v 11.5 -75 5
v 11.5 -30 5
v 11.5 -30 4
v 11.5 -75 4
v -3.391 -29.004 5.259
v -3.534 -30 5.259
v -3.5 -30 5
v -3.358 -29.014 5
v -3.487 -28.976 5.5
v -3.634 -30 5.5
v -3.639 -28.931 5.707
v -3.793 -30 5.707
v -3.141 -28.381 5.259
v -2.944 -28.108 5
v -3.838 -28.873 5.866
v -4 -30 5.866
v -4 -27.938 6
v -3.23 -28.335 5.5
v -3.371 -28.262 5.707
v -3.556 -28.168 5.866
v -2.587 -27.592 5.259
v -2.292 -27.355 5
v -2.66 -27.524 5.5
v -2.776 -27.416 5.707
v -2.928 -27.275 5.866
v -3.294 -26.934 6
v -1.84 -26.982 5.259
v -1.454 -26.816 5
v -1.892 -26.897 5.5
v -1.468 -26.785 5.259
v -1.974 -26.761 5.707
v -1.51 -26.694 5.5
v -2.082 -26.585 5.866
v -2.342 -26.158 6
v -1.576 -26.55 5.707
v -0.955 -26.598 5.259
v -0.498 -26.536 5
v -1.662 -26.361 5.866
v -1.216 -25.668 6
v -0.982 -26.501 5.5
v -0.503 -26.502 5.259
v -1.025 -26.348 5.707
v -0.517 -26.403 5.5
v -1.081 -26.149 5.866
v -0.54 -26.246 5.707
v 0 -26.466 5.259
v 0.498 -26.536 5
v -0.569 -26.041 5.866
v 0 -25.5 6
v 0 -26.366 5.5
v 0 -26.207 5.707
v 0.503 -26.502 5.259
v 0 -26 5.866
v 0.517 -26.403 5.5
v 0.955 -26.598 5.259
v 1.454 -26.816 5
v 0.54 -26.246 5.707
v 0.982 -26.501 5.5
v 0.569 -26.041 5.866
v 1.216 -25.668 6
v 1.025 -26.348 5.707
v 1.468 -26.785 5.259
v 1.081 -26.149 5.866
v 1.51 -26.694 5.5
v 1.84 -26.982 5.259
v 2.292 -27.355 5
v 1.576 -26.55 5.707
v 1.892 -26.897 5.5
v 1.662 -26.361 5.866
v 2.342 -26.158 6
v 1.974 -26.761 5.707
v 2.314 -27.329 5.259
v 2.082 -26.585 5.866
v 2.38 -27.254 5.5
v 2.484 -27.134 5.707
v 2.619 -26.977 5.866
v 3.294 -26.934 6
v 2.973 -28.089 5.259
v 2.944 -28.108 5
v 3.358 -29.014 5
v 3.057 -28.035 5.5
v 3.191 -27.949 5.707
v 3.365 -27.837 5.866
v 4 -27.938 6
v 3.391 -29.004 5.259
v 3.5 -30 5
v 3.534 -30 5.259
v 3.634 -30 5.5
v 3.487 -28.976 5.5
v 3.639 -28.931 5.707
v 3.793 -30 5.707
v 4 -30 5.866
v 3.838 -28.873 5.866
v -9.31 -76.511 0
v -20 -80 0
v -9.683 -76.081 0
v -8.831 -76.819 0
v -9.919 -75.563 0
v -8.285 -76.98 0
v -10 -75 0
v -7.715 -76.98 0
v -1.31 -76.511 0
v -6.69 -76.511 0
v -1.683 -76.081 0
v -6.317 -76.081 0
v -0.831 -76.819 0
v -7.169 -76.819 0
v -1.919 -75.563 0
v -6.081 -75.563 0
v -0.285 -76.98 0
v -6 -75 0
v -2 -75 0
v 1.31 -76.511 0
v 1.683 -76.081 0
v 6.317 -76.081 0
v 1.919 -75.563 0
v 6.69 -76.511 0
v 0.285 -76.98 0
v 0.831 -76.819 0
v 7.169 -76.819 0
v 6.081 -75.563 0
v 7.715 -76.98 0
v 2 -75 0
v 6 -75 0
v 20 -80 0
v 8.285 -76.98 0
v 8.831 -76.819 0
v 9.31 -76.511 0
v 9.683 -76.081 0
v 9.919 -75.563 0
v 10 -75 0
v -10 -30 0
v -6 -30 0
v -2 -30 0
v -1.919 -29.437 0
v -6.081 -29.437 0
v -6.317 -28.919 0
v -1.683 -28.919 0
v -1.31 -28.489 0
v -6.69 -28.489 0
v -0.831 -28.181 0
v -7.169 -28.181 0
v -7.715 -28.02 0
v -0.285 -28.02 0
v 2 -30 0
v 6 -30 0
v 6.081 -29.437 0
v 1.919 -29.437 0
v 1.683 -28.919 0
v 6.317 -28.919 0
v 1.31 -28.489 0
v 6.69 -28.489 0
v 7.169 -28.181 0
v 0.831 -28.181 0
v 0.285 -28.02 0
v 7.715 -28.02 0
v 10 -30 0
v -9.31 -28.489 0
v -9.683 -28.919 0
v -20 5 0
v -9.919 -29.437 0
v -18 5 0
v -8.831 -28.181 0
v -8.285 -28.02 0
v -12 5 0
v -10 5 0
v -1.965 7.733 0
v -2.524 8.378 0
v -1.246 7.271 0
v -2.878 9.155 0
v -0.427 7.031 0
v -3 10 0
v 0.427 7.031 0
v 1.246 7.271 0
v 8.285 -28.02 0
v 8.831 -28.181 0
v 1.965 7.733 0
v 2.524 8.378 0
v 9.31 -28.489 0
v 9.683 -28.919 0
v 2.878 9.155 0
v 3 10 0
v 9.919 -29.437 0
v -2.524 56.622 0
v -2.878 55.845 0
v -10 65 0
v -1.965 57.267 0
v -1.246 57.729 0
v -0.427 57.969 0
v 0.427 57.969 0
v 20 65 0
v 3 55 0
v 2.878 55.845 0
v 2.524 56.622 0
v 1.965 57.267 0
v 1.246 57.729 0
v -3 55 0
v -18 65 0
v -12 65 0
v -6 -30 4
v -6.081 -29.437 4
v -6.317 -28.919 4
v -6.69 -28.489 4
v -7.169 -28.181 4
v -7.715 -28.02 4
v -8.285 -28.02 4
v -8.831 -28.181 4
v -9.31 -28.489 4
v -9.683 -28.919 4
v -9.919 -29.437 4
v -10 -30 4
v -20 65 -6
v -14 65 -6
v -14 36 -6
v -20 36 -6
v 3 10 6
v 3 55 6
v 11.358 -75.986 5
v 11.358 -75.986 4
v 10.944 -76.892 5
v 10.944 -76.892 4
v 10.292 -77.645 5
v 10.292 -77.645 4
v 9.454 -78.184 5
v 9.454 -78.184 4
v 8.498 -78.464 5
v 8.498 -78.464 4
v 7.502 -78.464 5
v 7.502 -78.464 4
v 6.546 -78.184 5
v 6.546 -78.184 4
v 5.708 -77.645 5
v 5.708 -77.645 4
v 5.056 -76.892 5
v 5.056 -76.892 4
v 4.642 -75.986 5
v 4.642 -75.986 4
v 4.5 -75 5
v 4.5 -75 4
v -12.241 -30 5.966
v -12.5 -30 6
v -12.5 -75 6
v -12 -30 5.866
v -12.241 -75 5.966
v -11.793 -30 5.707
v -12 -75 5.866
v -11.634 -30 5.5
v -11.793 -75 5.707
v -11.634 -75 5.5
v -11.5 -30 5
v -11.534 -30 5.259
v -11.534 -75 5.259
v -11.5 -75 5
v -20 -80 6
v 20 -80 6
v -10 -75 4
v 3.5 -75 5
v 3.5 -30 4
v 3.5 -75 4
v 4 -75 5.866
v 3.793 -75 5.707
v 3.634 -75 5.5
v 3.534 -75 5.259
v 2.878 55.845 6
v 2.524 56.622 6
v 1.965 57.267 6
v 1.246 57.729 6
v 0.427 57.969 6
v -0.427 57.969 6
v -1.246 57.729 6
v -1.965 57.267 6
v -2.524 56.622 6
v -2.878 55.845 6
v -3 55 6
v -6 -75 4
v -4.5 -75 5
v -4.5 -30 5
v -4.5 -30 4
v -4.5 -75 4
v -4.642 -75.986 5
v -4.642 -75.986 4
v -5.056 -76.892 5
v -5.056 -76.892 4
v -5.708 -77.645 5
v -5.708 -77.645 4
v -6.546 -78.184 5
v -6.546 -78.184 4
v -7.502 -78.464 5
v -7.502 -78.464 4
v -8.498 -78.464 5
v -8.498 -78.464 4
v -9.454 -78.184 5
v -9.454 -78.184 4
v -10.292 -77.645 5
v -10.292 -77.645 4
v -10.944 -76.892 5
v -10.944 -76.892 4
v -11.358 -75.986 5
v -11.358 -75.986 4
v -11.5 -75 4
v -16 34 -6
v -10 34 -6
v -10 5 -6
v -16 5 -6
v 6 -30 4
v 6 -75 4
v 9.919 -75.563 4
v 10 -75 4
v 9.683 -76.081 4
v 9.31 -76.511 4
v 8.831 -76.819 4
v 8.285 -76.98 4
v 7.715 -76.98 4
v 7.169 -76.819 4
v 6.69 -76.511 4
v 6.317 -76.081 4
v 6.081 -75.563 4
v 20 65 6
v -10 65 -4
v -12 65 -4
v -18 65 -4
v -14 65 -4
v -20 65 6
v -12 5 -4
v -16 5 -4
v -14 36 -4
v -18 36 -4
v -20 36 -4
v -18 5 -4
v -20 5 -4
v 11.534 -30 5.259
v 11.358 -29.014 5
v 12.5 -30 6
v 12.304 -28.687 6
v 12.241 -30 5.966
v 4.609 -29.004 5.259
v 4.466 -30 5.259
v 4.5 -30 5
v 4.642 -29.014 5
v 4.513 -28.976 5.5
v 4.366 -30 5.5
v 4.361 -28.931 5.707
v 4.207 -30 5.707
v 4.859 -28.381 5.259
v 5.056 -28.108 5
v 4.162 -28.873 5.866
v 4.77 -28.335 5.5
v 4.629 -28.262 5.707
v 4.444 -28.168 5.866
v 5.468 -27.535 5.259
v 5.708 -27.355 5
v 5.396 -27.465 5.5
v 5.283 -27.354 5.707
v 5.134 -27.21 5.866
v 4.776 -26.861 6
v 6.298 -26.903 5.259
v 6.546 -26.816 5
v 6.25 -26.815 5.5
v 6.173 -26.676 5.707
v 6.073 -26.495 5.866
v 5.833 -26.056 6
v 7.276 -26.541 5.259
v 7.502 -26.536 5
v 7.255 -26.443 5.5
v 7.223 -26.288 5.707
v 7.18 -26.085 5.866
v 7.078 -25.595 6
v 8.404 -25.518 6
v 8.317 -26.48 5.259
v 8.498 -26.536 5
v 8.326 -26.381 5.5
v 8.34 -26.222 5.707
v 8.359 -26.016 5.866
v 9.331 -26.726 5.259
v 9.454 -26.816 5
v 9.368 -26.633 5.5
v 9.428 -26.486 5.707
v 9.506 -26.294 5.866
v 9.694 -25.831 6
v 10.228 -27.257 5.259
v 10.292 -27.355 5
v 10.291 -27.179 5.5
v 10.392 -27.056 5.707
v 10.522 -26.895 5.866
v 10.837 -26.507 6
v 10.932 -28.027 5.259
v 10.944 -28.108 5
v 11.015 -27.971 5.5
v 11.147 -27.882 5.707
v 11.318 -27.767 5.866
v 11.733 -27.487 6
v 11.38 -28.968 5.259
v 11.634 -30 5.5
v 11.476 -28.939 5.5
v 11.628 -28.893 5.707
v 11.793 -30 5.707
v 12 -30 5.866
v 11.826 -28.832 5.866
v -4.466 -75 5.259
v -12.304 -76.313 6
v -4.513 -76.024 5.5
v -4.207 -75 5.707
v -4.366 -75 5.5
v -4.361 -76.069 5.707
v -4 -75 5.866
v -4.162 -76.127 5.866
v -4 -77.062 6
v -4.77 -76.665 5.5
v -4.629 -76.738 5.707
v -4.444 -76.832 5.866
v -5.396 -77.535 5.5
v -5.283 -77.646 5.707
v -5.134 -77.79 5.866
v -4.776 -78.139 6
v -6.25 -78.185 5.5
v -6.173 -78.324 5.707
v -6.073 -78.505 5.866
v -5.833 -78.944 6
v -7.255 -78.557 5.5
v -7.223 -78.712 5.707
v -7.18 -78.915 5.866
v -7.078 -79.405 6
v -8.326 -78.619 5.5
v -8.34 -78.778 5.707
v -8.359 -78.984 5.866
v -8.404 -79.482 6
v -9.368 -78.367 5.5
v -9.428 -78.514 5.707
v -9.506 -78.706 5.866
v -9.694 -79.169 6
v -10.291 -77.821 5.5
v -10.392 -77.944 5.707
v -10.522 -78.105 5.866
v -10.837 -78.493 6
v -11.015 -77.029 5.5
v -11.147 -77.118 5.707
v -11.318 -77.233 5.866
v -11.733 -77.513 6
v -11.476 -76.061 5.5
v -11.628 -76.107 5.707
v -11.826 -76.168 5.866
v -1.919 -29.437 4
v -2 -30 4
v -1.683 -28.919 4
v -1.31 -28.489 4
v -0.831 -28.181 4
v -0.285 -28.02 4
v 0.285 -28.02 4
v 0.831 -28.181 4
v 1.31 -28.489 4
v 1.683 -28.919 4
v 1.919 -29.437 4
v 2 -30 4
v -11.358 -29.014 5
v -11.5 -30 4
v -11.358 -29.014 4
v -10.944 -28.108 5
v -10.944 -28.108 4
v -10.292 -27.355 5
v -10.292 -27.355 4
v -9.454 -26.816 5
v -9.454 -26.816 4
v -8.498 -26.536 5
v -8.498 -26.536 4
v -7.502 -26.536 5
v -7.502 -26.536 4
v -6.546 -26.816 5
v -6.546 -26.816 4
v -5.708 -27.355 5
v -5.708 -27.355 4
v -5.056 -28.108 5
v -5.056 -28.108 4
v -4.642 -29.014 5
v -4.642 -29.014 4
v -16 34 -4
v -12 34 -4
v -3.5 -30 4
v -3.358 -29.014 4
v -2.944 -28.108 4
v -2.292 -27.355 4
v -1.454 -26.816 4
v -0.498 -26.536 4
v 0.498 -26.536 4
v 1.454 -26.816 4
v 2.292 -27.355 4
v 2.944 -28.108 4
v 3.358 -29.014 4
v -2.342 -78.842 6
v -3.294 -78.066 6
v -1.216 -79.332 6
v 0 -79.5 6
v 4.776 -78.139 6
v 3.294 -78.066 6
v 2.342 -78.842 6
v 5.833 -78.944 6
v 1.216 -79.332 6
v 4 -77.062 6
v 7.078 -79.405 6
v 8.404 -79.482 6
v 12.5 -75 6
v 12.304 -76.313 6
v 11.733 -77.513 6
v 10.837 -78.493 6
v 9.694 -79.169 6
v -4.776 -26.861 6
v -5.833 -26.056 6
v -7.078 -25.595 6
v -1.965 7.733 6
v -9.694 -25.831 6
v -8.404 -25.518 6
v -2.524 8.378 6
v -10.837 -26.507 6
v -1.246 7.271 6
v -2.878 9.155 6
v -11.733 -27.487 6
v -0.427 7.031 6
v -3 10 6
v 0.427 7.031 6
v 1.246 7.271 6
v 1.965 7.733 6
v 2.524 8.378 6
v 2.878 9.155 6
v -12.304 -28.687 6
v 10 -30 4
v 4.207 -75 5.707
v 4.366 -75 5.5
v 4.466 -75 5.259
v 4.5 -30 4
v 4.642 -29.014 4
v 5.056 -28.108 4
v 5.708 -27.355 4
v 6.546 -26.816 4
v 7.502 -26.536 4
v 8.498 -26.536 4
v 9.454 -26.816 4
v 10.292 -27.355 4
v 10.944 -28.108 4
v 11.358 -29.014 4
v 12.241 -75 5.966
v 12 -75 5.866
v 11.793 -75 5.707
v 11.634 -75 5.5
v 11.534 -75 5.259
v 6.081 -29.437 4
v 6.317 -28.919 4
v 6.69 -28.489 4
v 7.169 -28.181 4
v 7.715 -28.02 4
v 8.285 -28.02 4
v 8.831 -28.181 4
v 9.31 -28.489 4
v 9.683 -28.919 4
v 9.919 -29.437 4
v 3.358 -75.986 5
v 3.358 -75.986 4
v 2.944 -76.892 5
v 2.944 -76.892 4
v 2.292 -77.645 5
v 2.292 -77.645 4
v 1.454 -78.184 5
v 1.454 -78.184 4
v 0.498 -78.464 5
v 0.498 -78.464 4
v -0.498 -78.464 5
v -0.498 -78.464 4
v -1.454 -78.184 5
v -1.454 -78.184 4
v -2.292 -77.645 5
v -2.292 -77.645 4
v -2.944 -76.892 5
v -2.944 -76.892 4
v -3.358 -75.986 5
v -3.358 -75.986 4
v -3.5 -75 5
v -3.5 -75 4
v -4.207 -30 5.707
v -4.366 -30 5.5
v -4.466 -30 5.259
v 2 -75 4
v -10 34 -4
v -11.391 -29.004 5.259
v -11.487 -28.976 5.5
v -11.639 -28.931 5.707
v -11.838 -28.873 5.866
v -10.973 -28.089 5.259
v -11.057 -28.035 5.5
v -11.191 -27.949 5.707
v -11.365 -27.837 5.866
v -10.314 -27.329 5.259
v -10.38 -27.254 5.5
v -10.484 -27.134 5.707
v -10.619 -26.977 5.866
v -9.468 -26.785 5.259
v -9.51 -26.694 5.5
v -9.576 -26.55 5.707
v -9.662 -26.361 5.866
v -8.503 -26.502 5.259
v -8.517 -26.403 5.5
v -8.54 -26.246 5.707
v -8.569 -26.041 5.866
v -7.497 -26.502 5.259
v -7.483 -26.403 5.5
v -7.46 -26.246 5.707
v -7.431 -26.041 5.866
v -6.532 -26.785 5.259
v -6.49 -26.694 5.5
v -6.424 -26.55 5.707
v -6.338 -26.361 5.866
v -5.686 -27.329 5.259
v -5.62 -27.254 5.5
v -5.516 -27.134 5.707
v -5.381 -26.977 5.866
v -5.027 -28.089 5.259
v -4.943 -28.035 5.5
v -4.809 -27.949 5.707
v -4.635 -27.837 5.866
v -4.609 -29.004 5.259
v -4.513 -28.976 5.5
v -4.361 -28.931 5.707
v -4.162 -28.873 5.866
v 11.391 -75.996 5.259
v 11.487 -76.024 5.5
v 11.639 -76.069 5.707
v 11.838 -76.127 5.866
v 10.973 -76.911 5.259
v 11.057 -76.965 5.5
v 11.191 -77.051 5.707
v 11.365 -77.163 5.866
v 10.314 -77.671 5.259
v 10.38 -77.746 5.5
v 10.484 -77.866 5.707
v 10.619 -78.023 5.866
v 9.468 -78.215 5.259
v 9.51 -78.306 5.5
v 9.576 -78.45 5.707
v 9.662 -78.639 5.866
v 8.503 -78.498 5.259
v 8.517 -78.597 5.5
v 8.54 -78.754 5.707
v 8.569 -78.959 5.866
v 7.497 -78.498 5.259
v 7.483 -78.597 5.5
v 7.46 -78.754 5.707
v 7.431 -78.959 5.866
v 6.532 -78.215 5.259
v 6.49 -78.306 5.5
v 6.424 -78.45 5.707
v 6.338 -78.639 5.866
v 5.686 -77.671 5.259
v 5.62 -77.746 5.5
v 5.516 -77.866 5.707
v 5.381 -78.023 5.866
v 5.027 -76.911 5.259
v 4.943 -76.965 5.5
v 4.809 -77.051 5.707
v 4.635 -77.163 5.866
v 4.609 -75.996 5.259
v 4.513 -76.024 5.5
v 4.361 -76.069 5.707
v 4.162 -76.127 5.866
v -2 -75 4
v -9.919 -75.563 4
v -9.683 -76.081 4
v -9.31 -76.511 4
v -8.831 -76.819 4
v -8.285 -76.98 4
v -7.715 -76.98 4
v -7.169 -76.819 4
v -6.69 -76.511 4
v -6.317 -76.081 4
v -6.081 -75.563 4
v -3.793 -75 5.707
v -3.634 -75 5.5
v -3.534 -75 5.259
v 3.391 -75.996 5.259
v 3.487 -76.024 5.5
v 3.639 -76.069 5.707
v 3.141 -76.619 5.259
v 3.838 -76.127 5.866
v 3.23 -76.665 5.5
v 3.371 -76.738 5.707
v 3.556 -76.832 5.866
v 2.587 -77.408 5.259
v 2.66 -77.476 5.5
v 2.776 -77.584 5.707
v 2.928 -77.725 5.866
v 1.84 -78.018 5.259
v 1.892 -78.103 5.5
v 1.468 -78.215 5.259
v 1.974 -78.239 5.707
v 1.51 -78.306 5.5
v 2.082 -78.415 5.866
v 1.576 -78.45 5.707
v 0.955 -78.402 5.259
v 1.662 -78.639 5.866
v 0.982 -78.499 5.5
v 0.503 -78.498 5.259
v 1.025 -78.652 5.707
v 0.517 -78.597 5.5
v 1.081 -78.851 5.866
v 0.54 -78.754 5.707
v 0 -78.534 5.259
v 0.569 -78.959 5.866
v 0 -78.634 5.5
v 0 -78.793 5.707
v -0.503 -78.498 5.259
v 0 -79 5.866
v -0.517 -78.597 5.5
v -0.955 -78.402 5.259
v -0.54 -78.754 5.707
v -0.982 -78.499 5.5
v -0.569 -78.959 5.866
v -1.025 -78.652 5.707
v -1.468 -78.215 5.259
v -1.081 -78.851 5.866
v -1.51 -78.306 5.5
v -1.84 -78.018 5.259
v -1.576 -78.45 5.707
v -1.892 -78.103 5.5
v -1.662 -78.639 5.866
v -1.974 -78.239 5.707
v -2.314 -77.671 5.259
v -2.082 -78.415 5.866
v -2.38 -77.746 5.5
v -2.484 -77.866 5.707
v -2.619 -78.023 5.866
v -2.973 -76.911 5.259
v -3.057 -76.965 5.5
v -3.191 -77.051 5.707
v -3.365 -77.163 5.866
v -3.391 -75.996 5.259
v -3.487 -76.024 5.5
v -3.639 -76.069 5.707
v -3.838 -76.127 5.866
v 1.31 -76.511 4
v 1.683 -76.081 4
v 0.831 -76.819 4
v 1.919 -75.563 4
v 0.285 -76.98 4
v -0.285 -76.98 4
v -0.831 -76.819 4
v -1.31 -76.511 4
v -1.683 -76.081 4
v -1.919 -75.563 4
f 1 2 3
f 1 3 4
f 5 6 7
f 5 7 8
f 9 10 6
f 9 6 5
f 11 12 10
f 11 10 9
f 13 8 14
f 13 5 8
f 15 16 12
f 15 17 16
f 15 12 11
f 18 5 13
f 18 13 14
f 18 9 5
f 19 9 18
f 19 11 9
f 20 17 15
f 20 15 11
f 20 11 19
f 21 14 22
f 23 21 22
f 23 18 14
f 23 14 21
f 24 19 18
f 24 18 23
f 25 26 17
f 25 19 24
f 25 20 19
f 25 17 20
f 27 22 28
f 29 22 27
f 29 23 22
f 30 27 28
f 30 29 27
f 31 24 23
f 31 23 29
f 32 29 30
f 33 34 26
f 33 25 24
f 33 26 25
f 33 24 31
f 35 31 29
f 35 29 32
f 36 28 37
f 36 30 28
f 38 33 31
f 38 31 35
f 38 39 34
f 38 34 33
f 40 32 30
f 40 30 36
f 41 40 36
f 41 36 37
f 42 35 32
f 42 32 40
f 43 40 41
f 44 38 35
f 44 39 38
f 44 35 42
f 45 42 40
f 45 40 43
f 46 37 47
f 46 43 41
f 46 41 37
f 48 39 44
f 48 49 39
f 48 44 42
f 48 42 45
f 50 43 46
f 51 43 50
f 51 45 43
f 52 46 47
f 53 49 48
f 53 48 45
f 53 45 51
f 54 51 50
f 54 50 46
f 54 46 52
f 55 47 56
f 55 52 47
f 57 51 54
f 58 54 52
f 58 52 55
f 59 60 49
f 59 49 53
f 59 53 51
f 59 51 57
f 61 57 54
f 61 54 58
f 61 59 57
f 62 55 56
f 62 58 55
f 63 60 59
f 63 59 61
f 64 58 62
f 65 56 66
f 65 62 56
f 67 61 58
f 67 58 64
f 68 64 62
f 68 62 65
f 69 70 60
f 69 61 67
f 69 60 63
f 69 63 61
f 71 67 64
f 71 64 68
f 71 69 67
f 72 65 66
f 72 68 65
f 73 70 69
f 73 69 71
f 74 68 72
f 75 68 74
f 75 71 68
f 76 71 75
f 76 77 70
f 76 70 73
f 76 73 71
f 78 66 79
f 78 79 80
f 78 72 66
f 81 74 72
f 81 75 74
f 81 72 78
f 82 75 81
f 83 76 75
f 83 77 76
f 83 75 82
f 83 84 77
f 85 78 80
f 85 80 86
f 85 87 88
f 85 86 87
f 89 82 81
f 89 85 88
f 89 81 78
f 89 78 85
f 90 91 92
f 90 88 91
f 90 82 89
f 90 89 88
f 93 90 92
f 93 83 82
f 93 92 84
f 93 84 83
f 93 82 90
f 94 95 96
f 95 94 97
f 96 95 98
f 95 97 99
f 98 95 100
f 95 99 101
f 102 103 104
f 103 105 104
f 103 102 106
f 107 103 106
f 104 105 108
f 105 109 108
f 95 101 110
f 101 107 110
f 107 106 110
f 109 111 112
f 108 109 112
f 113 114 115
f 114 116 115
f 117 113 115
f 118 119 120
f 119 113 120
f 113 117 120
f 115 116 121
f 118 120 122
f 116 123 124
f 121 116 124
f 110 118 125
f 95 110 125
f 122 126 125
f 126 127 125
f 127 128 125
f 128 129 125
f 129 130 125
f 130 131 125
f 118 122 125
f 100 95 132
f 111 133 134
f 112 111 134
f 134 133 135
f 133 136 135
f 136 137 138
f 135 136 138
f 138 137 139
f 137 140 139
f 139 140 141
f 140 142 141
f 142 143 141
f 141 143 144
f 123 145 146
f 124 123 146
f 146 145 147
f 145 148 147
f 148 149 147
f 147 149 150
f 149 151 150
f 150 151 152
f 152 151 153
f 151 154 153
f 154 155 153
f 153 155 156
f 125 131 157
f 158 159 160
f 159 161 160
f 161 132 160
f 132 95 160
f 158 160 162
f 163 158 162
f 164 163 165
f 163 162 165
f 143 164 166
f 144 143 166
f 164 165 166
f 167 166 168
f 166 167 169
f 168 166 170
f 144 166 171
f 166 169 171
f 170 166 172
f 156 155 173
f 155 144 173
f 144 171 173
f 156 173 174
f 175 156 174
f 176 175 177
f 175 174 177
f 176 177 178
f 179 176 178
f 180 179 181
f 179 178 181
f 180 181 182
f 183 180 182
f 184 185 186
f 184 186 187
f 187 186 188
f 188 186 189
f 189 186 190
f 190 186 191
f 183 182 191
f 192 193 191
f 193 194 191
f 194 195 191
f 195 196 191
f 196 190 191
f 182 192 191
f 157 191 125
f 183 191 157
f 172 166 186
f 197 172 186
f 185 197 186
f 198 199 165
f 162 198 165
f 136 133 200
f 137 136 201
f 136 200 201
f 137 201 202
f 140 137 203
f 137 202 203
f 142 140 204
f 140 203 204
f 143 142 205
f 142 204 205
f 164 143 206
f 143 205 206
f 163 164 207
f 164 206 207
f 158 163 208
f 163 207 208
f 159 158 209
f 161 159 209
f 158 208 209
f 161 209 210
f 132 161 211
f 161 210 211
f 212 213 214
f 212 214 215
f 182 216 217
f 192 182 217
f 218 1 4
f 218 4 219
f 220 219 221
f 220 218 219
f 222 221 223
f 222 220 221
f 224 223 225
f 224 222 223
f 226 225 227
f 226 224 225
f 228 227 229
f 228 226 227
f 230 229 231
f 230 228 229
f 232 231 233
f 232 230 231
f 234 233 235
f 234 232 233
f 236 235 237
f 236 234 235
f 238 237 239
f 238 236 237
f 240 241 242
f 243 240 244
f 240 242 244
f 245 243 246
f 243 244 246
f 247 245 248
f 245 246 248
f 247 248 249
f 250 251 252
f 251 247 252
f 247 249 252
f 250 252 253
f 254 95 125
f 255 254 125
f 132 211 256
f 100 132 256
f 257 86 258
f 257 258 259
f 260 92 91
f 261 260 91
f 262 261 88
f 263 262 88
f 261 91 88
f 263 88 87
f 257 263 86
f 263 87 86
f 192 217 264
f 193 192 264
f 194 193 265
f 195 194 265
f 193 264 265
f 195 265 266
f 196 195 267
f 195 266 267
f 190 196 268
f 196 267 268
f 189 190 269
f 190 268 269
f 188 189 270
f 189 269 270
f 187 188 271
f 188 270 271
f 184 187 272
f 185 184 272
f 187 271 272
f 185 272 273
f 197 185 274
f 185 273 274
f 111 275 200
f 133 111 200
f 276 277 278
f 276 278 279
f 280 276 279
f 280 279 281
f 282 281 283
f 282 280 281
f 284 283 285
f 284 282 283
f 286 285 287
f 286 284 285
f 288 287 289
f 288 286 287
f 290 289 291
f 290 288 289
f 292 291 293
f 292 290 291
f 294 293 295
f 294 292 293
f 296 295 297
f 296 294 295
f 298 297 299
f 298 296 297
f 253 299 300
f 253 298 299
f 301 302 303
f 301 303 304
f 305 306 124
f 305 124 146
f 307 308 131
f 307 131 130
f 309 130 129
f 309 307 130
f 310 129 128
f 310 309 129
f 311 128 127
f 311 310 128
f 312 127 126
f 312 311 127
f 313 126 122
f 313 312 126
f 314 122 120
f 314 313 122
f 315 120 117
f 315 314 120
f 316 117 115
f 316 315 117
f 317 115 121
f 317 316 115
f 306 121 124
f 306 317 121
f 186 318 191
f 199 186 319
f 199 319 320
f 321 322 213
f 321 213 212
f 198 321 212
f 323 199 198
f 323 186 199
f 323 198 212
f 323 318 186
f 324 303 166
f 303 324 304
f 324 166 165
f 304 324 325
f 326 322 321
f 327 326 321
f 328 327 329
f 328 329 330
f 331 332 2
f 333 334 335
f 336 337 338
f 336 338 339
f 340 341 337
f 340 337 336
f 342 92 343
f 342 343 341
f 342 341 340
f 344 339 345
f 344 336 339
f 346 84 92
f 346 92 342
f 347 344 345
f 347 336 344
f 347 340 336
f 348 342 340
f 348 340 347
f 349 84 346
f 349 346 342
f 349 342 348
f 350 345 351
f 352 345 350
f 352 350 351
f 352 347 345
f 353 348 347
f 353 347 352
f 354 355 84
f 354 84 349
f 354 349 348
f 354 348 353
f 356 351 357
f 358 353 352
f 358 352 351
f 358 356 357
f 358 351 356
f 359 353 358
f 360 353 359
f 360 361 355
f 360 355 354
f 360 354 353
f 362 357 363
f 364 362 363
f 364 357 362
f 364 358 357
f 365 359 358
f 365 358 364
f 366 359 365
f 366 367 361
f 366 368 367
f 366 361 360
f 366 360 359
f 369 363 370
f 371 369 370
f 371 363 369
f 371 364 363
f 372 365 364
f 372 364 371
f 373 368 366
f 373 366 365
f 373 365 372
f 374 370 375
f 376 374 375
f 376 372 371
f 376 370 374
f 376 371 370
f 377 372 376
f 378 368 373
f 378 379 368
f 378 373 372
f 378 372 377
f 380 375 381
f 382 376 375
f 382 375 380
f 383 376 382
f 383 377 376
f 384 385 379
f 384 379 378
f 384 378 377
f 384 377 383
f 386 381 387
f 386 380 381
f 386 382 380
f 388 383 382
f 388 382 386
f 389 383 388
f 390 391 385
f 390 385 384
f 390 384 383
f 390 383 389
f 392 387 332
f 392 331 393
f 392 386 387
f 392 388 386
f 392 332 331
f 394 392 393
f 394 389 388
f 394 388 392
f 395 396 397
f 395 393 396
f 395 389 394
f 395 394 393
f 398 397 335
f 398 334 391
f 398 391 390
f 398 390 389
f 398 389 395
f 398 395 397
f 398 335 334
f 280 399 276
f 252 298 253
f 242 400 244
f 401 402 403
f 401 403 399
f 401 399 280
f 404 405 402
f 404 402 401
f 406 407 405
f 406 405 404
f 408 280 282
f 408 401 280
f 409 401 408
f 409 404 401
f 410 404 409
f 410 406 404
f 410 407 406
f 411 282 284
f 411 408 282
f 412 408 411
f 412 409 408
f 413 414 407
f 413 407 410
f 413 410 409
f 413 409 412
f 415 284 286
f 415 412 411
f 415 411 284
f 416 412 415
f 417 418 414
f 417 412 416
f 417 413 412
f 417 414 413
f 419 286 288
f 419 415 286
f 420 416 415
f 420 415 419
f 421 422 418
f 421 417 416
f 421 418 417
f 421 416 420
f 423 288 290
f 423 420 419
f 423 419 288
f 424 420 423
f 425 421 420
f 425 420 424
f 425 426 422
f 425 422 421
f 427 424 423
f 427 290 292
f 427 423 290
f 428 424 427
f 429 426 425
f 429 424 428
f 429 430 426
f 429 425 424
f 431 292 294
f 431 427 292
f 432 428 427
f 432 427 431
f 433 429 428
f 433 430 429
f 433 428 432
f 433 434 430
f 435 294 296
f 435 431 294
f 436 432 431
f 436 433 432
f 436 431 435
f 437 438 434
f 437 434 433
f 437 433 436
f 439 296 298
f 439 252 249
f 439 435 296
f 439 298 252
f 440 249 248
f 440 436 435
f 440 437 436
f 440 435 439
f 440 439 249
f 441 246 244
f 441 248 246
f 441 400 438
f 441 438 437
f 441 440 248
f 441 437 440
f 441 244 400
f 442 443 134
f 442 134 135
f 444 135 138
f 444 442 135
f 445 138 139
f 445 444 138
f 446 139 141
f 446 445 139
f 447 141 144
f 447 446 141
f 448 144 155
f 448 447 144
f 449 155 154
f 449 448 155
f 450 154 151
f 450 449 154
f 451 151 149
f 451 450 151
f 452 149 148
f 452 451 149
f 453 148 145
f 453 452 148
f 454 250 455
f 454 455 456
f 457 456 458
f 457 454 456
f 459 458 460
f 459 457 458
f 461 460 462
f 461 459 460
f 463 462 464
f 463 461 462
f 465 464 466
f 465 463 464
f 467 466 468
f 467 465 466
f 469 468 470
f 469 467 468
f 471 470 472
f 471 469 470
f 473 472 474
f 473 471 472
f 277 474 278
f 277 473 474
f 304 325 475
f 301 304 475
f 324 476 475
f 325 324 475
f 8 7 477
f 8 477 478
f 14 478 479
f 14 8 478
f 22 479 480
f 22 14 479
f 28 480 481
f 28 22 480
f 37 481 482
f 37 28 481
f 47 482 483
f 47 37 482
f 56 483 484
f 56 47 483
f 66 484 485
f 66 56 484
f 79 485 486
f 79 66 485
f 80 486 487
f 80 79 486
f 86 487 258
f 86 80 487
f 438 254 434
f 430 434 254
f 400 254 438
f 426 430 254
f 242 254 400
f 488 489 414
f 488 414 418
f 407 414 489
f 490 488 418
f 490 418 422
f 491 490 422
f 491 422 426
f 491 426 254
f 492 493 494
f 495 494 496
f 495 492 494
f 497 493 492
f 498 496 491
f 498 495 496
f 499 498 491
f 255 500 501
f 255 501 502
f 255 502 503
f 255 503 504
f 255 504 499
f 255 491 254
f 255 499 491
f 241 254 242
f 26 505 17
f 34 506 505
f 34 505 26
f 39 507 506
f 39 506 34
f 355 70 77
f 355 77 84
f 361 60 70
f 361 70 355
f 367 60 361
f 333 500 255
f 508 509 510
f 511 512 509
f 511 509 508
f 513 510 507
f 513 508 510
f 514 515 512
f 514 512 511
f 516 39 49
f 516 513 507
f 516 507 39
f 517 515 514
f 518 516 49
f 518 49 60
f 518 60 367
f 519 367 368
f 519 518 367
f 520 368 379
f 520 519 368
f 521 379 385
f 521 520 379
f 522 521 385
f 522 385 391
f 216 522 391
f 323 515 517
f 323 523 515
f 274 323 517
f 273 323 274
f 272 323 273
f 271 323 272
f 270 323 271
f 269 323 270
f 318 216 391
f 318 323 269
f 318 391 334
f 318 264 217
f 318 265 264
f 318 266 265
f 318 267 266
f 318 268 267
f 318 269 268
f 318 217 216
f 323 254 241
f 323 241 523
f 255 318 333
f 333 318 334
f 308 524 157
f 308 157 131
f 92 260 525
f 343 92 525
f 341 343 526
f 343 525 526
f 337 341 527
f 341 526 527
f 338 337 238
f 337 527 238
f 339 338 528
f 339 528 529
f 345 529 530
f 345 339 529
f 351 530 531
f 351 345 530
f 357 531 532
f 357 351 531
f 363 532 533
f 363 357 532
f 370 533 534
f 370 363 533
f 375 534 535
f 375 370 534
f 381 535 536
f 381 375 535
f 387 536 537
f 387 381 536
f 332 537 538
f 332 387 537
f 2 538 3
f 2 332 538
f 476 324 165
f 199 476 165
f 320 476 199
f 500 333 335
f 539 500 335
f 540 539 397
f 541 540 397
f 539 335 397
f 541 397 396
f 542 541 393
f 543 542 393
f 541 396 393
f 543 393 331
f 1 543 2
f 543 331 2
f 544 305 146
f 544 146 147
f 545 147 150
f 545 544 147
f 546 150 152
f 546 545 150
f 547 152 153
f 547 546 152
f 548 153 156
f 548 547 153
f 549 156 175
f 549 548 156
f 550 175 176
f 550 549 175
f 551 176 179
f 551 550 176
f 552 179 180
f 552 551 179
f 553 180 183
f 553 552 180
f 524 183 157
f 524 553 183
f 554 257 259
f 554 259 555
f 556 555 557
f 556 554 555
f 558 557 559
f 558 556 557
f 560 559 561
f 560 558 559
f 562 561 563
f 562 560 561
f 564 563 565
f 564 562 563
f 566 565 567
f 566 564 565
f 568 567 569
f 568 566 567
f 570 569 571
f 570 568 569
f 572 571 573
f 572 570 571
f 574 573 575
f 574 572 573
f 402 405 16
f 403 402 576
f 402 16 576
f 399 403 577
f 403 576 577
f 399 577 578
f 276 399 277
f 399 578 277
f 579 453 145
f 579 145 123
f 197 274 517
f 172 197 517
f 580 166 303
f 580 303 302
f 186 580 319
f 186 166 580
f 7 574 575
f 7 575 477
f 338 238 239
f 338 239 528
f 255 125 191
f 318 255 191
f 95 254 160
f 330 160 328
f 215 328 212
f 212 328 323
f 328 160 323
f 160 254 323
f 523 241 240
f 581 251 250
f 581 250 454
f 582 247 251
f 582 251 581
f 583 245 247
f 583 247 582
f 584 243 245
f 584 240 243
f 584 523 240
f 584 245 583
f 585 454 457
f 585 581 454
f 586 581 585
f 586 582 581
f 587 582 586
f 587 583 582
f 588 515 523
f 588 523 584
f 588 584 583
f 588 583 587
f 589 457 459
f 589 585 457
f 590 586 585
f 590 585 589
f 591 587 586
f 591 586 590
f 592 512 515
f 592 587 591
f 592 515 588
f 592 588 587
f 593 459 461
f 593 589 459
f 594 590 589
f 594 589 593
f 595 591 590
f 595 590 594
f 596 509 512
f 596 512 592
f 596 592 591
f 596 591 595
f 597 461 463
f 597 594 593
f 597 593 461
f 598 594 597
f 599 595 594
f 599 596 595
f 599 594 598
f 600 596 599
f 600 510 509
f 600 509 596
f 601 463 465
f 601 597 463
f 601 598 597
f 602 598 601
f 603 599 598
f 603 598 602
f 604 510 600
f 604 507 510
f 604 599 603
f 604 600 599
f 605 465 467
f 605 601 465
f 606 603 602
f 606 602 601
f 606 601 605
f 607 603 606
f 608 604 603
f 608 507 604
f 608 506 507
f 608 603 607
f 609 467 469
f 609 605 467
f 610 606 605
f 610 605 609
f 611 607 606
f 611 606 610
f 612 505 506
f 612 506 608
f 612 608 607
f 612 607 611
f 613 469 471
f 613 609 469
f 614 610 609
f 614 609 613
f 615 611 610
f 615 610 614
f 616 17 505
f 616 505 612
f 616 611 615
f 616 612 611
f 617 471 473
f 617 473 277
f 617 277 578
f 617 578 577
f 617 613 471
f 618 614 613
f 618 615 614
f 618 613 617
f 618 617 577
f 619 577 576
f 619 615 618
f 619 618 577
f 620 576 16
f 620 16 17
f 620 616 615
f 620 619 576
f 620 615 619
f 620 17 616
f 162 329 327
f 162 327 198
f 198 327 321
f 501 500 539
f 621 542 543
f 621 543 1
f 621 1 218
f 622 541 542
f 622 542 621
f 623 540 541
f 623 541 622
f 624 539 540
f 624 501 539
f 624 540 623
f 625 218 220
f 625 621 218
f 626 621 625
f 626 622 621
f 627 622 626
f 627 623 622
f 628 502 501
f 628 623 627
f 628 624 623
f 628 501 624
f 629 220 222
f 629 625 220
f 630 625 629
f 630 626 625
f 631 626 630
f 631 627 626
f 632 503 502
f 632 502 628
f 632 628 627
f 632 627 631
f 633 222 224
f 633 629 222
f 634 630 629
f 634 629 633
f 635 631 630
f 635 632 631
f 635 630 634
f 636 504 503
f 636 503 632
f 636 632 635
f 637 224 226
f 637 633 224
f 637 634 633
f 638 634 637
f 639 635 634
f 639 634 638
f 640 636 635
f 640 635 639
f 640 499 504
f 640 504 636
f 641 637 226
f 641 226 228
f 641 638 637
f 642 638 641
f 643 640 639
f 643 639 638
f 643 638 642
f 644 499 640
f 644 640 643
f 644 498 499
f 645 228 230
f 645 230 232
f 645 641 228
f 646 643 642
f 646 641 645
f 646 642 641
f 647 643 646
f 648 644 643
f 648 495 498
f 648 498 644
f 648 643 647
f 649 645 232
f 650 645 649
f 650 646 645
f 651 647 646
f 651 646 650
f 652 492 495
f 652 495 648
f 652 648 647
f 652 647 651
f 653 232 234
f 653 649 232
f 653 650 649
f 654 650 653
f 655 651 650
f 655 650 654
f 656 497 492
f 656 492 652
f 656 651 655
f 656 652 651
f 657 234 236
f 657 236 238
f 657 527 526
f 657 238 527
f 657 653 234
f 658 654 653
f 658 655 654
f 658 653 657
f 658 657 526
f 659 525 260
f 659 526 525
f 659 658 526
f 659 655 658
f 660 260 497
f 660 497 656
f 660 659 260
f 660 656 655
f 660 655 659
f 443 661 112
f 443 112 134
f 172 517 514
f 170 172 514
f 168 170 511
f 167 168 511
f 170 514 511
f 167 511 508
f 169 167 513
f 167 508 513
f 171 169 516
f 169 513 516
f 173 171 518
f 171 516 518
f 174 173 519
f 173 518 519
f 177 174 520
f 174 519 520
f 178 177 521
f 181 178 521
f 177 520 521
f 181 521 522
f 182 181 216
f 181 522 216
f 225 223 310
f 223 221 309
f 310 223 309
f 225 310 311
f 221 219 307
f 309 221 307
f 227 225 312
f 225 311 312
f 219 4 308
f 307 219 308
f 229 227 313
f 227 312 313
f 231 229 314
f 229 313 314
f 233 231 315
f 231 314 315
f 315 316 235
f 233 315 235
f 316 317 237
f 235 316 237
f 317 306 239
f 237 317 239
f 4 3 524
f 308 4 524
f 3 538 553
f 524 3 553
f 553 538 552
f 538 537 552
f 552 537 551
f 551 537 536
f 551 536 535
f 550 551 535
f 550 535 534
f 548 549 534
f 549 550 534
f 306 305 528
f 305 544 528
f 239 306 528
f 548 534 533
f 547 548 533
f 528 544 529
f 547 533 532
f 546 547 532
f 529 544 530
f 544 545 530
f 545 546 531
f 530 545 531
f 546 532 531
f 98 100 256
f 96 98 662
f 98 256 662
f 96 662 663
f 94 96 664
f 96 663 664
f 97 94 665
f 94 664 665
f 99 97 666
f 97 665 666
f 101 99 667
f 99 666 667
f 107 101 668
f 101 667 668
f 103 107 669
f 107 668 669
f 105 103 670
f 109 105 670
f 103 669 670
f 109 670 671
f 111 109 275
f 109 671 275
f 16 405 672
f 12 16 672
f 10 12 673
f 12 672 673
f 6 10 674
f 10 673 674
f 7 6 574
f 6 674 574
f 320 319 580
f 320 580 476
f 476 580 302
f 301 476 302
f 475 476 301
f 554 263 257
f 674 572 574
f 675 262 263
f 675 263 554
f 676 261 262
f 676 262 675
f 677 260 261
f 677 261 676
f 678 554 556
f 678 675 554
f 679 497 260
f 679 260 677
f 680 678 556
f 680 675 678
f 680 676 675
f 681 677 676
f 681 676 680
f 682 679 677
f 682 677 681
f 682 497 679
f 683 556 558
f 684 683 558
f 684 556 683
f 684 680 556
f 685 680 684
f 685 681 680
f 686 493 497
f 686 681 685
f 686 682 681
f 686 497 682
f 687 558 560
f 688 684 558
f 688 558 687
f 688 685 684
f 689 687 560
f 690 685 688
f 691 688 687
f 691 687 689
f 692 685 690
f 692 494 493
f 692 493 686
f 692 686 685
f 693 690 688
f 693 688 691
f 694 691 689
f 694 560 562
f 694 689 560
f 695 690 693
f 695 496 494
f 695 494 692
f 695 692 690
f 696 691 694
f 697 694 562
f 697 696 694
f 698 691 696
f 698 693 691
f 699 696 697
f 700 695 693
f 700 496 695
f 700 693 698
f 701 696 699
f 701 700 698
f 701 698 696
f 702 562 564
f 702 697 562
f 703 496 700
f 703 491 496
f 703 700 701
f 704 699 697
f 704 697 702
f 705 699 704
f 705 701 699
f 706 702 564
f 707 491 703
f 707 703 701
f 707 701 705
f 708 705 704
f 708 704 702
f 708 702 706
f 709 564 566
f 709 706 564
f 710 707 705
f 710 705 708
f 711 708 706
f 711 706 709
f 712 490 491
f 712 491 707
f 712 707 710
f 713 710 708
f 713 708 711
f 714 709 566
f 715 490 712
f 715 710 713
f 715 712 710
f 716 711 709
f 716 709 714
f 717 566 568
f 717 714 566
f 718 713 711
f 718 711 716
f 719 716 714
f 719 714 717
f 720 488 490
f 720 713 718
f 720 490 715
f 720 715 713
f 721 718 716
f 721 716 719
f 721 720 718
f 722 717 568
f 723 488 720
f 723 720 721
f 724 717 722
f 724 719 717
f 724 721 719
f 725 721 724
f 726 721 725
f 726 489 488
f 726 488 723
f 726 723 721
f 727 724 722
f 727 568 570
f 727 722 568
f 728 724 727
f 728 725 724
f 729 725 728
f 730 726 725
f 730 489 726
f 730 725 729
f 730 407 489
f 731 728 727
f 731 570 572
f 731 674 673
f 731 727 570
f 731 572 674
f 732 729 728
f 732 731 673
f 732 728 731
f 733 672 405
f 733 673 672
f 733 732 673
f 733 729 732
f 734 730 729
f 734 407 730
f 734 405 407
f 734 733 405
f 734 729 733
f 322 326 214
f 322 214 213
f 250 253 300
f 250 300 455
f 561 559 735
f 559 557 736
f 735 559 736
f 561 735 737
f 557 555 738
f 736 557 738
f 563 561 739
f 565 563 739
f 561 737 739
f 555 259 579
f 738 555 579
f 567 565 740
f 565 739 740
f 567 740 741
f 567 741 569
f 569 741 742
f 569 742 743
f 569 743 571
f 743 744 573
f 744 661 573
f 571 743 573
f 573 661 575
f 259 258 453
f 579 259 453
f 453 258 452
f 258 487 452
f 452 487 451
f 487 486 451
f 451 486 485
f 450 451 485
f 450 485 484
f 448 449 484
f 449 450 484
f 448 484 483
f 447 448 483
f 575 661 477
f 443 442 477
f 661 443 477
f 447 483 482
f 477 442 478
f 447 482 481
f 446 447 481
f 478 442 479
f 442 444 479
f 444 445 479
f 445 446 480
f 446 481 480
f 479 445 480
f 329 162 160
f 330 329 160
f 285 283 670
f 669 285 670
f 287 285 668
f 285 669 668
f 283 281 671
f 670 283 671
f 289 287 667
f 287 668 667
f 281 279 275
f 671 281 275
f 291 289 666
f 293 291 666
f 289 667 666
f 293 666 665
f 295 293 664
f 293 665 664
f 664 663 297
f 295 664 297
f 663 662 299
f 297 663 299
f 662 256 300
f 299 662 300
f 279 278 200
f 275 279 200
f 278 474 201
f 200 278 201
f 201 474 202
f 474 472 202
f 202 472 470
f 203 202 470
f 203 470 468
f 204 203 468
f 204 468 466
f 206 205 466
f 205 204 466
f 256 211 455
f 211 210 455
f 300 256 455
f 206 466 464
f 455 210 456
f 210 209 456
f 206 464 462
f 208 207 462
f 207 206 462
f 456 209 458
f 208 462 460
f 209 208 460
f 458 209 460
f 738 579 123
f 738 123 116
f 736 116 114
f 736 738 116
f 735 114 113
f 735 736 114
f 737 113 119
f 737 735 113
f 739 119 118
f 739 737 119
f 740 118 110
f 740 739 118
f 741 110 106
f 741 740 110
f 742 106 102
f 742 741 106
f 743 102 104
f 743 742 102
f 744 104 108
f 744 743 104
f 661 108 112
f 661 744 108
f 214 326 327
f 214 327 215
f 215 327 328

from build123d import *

# Parameters (mm, degrees)
SKETCH_1_W          = 40
SKETCH_1_H          = 160
EXTRUDE_2_DEPTH     = 6
CUT_EXTRUDE_3_DEPTH = 10
SKETCH_5_W          = 40
SKETCH_5_H          = 15
CUT_EXTRUDE_4_DEPTH = 10
CUT_EXTRUDE_5_DEPTH = 10
CUT_EXTRUDE_6_DEPTH = 2
FILLET_1_R          = 1
SKETCH_10_W         = 10
SKETCH_10_H         = 60
EXTRUDE_3_DEPTH     = 4
SKETCH_11_W         = 6
SKETCH_11_H         = 60
CUT_EXTRUDE_7_DEPTH = 4
SKETCH_13_W         = 6
SKETCH_13_H         = 29
EXTRUDE_9_DEPTH     = 2


with BuildPart() as part:
    # Эскиз1 → Бобышка-Вытянуть2 (new body)
    with BuildSketch(Plane.XY):
        Rectangle(SKETCH_1_W, SKETCH_1_H)
    extrude(amount=EXTRUDE_2_DEPTH)

    # Эскиз3 → Вырез-Вытянуть3 (cut)
    with BuildSketch(Plane.XY.offset(6)):
        with BuildLine():
            Line((-3, 55), (-3, 10))
            ThreePointArc((-3, 10), (0, 7), (3, 10))
            Line((3, 10), (3, 55))
            ThreePointArc((3, 55), (0, 58), (-3, 55))
        make_face()
    extrude(amount=-CUT_EXTRUDE_3_DEPTH, mode=Mode.SUBTRACT)

    # Эскиз5 → Вырез-Вытянуть4 (cut)
    with BuildSketch(Plane.XY.offset(6)):
        with Locations((0, 72.5)):
            Rectangle(SKETCH_5_W, SKETCH_5_H)
    extrude(amount=-CUT_EXTRUDE_4_DEPTH, mode=Mode.SUBTRACT)

    # Эскиз7 → Вырез-Вытянуть5 (cut)
    with BuildSketch(Plane.XY.offset(6)):
        with BuildLine():
            Line((-10, -30), (-10, -75))
            ThreePointArc((-10, -75), (-8, -77), (-6, -75))
            Line((-6, -75), (-6, -30))
            ThreePointArc((-6, -30), (-8, -28), (-10, -30))
        make_face()
        with BuildLine():
            Line((-2, -75), (-2, -30))
            ThreePointArc((-2, -30), (0, -28), (2, -30))
            Line((2, -30), (2, -75))
            ThreePointArc((2, -75), (0, -77), (-2, -75))
        make_face()
        with BuildLine():
            Line((6, -75), (6, -30))
            ThreePointArc((6, -30), (8, -28), (10, -30))
            Line((10, -30), (10, -75))
            ThreePointArc((10, -75), (8, -77), (6, -75))
        make_face()
    extrude(amount=-CUT_EXTRUDE_5_DEPTH, mode=Mode.SUBTRACT)

    # Эскиз8 → Вырез-Вытянуть6 (cut)
    # profile 1 of 3: a face of its own
    with BuildSketch(Plane.XY.offset(6)):
        with BuildLine():
            ThreePointArc((-11.5, -30), (-8, -26.5), (-4.5, -30))
            Line((-4.5, -30), (-4.5, -75))
            ThreePointArc((-4.5, -75), (-8, -78.5), (-11.5, -75))
            Line((-11.5, -75), (-11.5, -30))
        make_face()
        with BuildLine():
            Line((-10, -75), (-10, -30))
            ThreePointArc((-10, -30), (-8, -28), (-6, -30))
            Line((-6, -30), (-6, -75))
            ThreePointArc((-6, -75), (-8, -77), (-10, -75))
        make_face(mode=Mode.SUBTRACT)
    # profile 2 of 3: a face of its own
    with BuildSketch(Plane.XY.offset(6)):
        with BuildLine():
            ThreePointArc((-3.5, -30), (0, -26.5), (3.5, -30))
            Line((3.5, -30), (3.5, -75))
            ThreePointArc((3.5, -75), (0, -78.5), (-3.5, -75))
            Line((-3.5, -75), (-3.5, -30))
        make_face()
        with BuildLine():
            ThreePointArc((2, -75), (0, -77), (-2, -75))
            Line((-2, -75), (-2, -30))
            ThreePointArc((-2, -30), (0, -28), (2, -30))
            Line((2, -30), (2, -75))
        make_face(mode=Mode.SUBTRACT)
    # profile 3 of 3: a face of its own
    with BuildSketch(Plane.XY.offset(6)):
        with BuildLine():
            ThreePointArc((4.5, -30), (8, -26.5), (11.5, -30))
            Line((11.5, -30), (11.5, -75))
            ThreePointArc((11.5, -75), (8, -78.5), (4.5, -75))
            Line((4.5, -75), (4.5, -30))
        make_face()
        with BuildLine():
            Line((6, -75), (6, -30))
            ThreePointArc((6, -30), (8, -28), (10, -30))
            Line((10, -30), (10, -75))
            ThreePointArc((10, -75), (8, -77), (6, -75))
        make_face(mode=Mode.SUBTRACT)
    extrude(amount=-CUT_EXTRUDE_6_DEPTH, mode=Mode.SUBTRACT)

    # Скругление1
    # the kernel refuses this fillet: 1 mm, written as the material it takes off along each edge
    with BuildSketch(Plane(origin=(-8, -30, 6), x_dir=(-1, 0, 0), z_dir=(0, -1, 0))) as fillet_1_piece_1:
        with BuildLine():
            CenterArc((3.5 + FILLET_1_R, FILLET_1_R), FILLET_1_R, 180, 90)
            Line((3.5, FILLET_1_R), (3.5, 0))
            Line((3.5, 0), (3.5 + FILLET_1_R, 0))
        make_face()
    revolve(axis=Axis((-8, -30, 6), (0, 0, -1)), revolution_arc=180, mode=Mode.SUBTRACT)
    with BuildSketch(Plane(origin=(-11.5, -75, 6), x_dir=(-1, 0, 0), z_dir=(0, 1, 0)), Plane(origin=(-4.5, -30, 6), x_dir=(1, 0, 0), z_dir=(0, -1, 0)), Plane(origin=(3.5, -30, 6), x_dir=(1, 0, 0), z_dir=(0, -1, 0)), Plane(origin=(-3.5, -75, 6), x_dir=(-1, 0, 0), z_dir=(0, 1, 0)), Plane(origin=(11.5, -30, 6), x_dir=(1, 0, 0), z_dir=(0, -1, 0)), Plane(origin=(4.5, -75, 6), x_dir=(-1, 0, 0), z_dir=(0, 1, 0))) as fillet_1_piece_2:
        with BuildLine():
            CenterArc((FILLET_1_R, -FILLET_1_R), FILLET_1_R, 90, 90)
            Line((0, -FILLET_1_R), (0, 0))
            Line((0, 0), (FILLET_1_R, 0))
        make_face()
    extrude(amount=45, mode=Mode.SUBTRACT)
    with BuildSketch(Plane(origin=(-8, -75, 6), x_dir=(1, 0, 0), z_dir=(0, 1, 0))) as fillet_1_piece_3:
        with BuildLine():
            CenterArc((3.5 + FILLET_1_R, FILLET_1_R), FILLET_1_R, 180, 90)
            Line((3.5, FILLET_1_R), (3.5, 0))
            Line((3.5, 0), (3.5 + FILLET_1_R, 0))
        make_face()
    revolve(axis=Axis((-8, -75, 6), (0, 0, -1)), revolution_arc=180, mode=Mode.SUBTRACT)
    with BuildSketch(Plane(origin=(0, -30, 6), x_dir=(-1, 0, 0), z_dir=(0, -1, 0))) as fillet_1_piece_4:
        with BuildLine():
            CenterArc((3.5 + FILLET_1_R, FILLET_1_R), FILLET_1_R, 180, 90)
            Line((3.5, FILLET_1_R), (3.5, 0))
            Line((3.5, 0), (3.5 + FILLET_1_R, 0))
        make_face()
    revolve(axis=Axis((0, -30, 6), (0, 0, -1)), revolution_arc=180, mode=Mode.SUBTRACT)
    with BuildSketch(Plane(origin=(0, -75, 6), x_dir=(1, 0, 0), z_dir=(0, 1, 0))) as fillet_1_piece_5:
        with BuildLine():
            CenterArc((3.5 + FILLET_1_R, FILLET_1_R), FILLET_1_R, 180, 90)
            Line((3.5, FILLET_1_R), (3.5, 0))
            Line((3.5, 0), (3.5 + FILLET_1_R, 0))
        make_face()
    revolve(axis=Axis((0, -75, 6), (0, 0, -1)), revolution_arc=180, mode=Mode.SUBTRACT)
    with BuildSketch(Plane(origin=(8, -30, 6), x_dir=(-1, 0, 0), z_dir=(0, -1, 0))) as fillet_1_piece_6:
        with BuildLine():
            CenterArc((3.5 + FILLET_1_R, FILLET_1_R), FILLET_1_R, 180, 90)
            Line((3.5, FILLET_1_R), (3.5, 0))
            Line((3.5, 0), (3.5 + FILLET_1_R, 0))
        make_face()
    revolve(axis=Axis((8, -30, 6), (0, 0, -1)), revolution_arc=180, mode=Mode.SUBTRACT)
    with BuildSketch(Plane(origin=(8, -75, 6), x_dir=(1, 0, 0), z_dir=(0, 1, 0))) as fillet_1_piece_7:
        with BuildLine():
            CenterArc((3.5 + FILLET_1_R, FILLET_1_R), FILLET_1_R, 180, 90)
            Line((3.5, FILLET_1_R), (3.5, 0))
            Line((3.5, 0), (3.5 + FILLET_1_R, 0))
        make_face()
    revolve(axis=Axis((8, -75, 6), (0, 0, -1)), revolution_arc=180, mode=Mode.SUBTRACT)

    # Эскиз10 → Бобышка-Вытянуть3 (add)
    with BuildSketch(Plane(origin=(0, 0, 0), x_dir=(-1, 0, 0), z_dir=(0, 0, -1))):
        with Locations((15, 35)):
            Rectangle(SKETCH_10_W, SKETCH_10_H)
    extrude(amount=EXTRUDE_3_DEPTH)

    # Эскиз11 → Вырез-Вытянуть7 (cut)
    with BuildSketch(Plane(origin=(0, 0, -4), x_dir=(-1, 0, 0), z_dir=(0, 0, -1))):
        with Locations((15, 35)):
            Rectangle(SKETCH_11_W, SKETCH_11_H)
    extrude(amount=-CUT_EXTRUDE_7_DEPTH, mode=Mode.SUBTRACT)

    # Эскиз13 → Бобышка-Вытянуть9 (add)
    with BuildSketch(Plane(origin=(0, 0, -4), x_dir=(-1, 0, 0), z_dir=(0, 0, -1))):
        with Locations((17, 50.5)):
            Rectangle(SKETCH_13_W, SKETCH_13_H)
        with Locations((13, 19.5)):
            Rectangle(SKETCH_13_W, SKETCH_13_H)
    extrude(amount=EXTRUDE_9_DEPTH)


solid = part.part
